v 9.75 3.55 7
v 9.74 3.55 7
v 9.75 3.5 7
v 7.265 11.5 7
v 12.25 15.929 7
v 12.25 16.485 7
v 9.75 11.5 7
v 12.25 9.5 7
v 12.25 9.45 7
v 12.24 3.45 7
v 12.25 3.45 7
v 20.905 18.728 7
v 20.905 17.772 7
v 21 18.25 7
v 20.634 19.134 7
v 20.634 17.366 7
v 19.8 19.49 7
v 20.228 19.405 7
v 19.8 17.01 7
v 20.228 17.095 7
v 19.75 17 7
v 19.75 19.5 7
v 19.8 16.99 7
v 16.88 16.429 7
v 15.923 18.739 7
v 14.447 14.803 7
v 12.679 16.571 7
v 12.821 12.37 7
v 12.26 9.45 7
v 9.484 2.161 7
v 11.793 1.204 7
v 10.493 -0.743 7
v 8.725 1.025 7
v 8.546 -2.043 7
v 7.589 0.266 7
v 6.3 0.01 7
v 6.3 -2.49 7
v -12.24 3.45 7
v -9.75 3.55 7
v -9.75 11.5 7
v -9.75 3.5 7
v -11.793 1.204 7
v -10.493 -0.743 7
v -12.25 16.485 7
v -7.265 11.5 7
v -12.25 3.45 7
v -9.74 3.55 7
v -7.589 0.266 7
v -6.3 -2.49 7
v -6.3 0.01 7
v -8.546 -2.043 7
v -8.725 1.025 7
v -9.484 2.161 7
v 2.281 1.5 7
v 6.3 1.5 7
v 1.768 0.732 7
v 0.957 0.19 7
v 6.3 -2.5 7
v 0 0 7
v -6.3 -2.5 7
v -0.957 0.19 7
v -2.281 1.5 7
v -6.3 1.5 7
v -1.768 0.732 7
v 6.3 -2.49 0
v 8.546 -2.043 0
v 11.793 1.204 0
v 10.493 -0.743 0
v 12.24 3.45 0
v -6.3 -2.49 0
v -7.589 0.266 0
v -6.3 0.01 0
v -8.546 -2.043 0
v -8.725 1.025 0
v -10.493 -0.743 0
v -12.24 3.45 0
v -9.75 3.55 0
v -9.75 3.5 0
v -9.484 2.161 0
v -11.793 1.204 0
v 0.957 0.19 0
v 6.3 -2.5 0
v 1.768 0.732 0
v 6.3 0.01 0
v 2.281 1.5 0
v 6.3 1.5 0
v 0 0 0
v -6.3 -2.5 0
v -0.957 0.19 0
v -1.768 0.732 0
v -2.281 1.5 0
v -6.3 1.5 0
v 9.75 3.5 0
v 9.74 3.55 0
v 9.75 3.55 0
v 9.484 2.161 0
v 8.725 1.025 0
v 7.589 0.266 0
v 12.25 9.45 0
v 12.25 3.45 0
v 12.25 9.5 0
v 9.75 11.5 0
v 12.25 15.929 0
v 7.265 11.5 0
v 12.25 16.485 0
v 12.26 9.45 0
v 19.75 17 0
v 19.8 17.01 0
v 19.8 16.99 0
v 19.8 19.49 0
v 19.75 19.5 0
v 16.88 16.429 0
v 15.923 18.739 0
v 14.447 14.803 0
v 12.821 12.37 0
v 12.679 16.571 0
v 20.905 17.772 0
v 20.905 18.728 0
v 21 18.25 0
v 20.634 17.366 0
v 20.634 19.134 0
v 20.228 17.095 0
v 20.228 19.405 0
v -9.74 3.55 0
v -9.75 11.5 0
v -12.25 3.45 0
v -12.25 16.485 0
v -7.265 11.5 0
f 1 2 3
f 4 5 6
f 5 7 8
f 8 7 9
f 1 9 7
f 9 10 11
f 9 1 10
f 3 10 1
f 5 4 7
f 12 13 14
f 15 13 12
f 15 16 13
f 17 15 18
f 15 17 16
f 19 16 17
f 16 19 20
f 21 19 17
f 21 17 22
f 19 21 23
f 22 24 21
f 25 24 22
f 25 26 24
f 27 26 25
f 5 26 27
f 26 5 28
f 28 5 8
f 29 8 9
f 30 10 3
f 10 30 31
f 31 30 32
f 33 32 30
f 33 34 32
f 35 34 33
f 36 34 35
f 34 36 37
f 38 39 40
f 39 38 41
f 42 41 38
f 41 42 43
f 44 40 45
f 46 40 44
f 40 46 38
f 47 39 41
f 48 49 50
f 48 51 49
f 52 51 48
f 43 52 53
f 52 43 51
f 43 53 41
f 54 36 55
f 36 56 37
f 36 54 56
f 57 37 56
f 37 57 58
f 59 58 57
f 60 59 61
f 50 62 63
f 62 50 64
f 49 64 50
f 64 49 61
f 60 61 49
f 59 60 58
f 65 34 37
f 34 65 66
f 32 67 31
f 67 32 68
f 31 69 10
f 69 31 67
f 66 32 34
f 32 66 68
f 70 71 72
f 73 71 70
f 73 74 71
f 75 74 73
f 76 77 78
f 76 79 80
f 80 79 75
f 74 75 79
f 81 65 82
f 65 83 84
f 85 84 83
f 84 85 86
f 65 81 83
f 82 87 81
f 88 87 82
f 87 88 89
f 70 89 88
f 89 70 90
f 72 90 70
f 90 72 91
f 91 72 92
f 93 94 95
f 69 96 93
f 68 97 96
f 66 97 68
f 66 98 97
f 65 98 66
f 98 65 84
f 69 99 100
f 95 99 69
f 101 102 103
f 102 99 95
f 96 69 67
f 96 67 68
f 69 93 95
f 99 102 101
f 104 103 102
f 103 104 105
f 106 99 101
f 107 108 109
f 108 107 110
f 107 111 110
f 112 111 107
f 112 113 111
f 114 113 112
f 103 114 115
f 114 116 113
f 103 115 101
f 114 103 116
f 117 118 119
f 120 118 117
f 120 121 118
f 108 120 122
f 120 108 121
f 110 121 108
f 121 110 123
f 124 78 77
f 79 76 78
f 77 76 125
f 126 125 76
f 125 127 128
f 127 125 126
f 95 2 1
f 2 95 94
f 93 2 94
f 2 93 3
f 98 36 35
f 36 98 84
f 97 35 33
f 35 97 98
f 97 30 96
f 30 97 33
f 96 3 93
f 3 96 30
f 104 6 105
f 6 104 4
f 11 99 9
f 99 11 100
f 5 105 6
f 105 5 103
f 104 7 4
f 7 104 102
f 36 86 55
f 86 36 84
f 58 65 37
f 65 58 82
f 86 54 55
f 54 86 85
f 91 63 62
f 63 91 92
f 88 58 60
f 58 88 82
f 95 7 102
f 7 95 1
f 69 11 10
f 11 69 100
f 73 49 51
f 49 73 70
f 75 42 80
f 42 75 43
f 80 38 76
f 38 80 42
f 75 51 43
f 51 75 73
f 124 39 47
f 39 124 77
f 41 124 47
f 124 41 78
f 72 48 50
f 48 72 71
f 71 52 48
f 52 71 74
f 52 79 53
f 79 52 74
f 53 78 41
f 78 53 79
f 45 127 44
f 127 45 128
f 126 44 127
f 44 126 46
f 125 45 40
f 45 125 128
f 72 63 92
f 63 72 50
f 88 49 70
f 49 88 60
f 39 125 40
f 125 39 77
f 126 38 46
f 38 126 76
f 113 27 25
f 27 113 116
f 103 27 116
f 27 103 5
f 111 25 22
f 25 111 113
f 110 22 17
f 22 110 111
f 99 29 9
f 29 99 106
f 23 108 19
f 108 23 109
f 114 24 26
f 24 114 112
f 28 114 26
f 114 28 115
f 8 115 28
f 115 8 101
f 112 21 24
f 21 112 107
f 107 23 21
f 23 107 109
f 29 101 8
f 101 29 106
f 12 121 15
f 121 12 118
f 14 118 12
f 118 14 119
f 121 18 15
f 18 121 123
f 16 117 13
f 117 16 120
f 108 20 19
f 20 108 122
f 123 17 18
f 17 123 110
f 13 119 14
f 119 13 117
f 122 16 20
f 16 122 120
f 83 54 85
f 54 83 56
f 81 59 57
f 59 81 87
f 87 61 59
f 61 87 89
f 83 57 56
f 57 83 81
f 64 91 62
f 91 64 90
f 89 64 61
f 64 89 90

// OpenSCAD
use <../utilities.scad>

span=19.5; //increased from 19
corner_r=6;
clip_to_cross=11.5;
t=2.5;
lip=2.5;
d=0.05;
h=7;
$fn=16;

difference(){
	union(){
		reflect([1,0,0]){
			translate([-d,-t,0]) cube([span/2+t+d-corner_r+d,t+1.5,h]);
			translate([span/2,corner_r-t-d,0]) cube([t,clip_to_cross+2*d-corner_r+t,h]);
			translate([span/2-corner_r+t,corner_r-t,0]) difference(){
				intersection(){
					cylinder(r=corner_r,h=h);
					mirror([0,1,0]) translate([-d,-d,-d]) cube([999,999,999]);
				}
				cylinder(r=corner_r-t,h=999,center=true);
			}
			translate([span/2+t,clip_to_cross,0]) mirror([1,0,0]) intersection(){
				rotate([0,0,45]) cube([(lip+t)*1.41,(lip+t)*1.41,2*h],center=true);
				cube([999,999,999]);
			}
		}
//		translate([span/2+t,clip_to_cross,0]) rotate([0,0,-45]) 
//			mirror([1,0,0]) translate([lip*1.41/2+t*(1.41/2-1),0,0]) cube([t,10,h]);
		assign(roc=10) translate([span/2+roc,clip_to_cross-roc/5,0]) union(){
			difference(){
				intersection(){
					cylinder(r=roc,h=h);
					rotate([0,0,90]) translate([-d,-d,-d]) cube([999,999,999]);
				}
				cylinder(r=roc-t,h=999,center=true);
			}
			translate([0,roc-t/2,0]) cylinder(r=t/2,$fn=16,h);
		}
	}
//	repeat([5,0,0],2,center=true) translate([0,0,h/2]) cube([2,999,3],center=true); //holes for cable ties
	translate([0,5/2,0]) cylinder(r=5/2,h=999,center=true);
}
